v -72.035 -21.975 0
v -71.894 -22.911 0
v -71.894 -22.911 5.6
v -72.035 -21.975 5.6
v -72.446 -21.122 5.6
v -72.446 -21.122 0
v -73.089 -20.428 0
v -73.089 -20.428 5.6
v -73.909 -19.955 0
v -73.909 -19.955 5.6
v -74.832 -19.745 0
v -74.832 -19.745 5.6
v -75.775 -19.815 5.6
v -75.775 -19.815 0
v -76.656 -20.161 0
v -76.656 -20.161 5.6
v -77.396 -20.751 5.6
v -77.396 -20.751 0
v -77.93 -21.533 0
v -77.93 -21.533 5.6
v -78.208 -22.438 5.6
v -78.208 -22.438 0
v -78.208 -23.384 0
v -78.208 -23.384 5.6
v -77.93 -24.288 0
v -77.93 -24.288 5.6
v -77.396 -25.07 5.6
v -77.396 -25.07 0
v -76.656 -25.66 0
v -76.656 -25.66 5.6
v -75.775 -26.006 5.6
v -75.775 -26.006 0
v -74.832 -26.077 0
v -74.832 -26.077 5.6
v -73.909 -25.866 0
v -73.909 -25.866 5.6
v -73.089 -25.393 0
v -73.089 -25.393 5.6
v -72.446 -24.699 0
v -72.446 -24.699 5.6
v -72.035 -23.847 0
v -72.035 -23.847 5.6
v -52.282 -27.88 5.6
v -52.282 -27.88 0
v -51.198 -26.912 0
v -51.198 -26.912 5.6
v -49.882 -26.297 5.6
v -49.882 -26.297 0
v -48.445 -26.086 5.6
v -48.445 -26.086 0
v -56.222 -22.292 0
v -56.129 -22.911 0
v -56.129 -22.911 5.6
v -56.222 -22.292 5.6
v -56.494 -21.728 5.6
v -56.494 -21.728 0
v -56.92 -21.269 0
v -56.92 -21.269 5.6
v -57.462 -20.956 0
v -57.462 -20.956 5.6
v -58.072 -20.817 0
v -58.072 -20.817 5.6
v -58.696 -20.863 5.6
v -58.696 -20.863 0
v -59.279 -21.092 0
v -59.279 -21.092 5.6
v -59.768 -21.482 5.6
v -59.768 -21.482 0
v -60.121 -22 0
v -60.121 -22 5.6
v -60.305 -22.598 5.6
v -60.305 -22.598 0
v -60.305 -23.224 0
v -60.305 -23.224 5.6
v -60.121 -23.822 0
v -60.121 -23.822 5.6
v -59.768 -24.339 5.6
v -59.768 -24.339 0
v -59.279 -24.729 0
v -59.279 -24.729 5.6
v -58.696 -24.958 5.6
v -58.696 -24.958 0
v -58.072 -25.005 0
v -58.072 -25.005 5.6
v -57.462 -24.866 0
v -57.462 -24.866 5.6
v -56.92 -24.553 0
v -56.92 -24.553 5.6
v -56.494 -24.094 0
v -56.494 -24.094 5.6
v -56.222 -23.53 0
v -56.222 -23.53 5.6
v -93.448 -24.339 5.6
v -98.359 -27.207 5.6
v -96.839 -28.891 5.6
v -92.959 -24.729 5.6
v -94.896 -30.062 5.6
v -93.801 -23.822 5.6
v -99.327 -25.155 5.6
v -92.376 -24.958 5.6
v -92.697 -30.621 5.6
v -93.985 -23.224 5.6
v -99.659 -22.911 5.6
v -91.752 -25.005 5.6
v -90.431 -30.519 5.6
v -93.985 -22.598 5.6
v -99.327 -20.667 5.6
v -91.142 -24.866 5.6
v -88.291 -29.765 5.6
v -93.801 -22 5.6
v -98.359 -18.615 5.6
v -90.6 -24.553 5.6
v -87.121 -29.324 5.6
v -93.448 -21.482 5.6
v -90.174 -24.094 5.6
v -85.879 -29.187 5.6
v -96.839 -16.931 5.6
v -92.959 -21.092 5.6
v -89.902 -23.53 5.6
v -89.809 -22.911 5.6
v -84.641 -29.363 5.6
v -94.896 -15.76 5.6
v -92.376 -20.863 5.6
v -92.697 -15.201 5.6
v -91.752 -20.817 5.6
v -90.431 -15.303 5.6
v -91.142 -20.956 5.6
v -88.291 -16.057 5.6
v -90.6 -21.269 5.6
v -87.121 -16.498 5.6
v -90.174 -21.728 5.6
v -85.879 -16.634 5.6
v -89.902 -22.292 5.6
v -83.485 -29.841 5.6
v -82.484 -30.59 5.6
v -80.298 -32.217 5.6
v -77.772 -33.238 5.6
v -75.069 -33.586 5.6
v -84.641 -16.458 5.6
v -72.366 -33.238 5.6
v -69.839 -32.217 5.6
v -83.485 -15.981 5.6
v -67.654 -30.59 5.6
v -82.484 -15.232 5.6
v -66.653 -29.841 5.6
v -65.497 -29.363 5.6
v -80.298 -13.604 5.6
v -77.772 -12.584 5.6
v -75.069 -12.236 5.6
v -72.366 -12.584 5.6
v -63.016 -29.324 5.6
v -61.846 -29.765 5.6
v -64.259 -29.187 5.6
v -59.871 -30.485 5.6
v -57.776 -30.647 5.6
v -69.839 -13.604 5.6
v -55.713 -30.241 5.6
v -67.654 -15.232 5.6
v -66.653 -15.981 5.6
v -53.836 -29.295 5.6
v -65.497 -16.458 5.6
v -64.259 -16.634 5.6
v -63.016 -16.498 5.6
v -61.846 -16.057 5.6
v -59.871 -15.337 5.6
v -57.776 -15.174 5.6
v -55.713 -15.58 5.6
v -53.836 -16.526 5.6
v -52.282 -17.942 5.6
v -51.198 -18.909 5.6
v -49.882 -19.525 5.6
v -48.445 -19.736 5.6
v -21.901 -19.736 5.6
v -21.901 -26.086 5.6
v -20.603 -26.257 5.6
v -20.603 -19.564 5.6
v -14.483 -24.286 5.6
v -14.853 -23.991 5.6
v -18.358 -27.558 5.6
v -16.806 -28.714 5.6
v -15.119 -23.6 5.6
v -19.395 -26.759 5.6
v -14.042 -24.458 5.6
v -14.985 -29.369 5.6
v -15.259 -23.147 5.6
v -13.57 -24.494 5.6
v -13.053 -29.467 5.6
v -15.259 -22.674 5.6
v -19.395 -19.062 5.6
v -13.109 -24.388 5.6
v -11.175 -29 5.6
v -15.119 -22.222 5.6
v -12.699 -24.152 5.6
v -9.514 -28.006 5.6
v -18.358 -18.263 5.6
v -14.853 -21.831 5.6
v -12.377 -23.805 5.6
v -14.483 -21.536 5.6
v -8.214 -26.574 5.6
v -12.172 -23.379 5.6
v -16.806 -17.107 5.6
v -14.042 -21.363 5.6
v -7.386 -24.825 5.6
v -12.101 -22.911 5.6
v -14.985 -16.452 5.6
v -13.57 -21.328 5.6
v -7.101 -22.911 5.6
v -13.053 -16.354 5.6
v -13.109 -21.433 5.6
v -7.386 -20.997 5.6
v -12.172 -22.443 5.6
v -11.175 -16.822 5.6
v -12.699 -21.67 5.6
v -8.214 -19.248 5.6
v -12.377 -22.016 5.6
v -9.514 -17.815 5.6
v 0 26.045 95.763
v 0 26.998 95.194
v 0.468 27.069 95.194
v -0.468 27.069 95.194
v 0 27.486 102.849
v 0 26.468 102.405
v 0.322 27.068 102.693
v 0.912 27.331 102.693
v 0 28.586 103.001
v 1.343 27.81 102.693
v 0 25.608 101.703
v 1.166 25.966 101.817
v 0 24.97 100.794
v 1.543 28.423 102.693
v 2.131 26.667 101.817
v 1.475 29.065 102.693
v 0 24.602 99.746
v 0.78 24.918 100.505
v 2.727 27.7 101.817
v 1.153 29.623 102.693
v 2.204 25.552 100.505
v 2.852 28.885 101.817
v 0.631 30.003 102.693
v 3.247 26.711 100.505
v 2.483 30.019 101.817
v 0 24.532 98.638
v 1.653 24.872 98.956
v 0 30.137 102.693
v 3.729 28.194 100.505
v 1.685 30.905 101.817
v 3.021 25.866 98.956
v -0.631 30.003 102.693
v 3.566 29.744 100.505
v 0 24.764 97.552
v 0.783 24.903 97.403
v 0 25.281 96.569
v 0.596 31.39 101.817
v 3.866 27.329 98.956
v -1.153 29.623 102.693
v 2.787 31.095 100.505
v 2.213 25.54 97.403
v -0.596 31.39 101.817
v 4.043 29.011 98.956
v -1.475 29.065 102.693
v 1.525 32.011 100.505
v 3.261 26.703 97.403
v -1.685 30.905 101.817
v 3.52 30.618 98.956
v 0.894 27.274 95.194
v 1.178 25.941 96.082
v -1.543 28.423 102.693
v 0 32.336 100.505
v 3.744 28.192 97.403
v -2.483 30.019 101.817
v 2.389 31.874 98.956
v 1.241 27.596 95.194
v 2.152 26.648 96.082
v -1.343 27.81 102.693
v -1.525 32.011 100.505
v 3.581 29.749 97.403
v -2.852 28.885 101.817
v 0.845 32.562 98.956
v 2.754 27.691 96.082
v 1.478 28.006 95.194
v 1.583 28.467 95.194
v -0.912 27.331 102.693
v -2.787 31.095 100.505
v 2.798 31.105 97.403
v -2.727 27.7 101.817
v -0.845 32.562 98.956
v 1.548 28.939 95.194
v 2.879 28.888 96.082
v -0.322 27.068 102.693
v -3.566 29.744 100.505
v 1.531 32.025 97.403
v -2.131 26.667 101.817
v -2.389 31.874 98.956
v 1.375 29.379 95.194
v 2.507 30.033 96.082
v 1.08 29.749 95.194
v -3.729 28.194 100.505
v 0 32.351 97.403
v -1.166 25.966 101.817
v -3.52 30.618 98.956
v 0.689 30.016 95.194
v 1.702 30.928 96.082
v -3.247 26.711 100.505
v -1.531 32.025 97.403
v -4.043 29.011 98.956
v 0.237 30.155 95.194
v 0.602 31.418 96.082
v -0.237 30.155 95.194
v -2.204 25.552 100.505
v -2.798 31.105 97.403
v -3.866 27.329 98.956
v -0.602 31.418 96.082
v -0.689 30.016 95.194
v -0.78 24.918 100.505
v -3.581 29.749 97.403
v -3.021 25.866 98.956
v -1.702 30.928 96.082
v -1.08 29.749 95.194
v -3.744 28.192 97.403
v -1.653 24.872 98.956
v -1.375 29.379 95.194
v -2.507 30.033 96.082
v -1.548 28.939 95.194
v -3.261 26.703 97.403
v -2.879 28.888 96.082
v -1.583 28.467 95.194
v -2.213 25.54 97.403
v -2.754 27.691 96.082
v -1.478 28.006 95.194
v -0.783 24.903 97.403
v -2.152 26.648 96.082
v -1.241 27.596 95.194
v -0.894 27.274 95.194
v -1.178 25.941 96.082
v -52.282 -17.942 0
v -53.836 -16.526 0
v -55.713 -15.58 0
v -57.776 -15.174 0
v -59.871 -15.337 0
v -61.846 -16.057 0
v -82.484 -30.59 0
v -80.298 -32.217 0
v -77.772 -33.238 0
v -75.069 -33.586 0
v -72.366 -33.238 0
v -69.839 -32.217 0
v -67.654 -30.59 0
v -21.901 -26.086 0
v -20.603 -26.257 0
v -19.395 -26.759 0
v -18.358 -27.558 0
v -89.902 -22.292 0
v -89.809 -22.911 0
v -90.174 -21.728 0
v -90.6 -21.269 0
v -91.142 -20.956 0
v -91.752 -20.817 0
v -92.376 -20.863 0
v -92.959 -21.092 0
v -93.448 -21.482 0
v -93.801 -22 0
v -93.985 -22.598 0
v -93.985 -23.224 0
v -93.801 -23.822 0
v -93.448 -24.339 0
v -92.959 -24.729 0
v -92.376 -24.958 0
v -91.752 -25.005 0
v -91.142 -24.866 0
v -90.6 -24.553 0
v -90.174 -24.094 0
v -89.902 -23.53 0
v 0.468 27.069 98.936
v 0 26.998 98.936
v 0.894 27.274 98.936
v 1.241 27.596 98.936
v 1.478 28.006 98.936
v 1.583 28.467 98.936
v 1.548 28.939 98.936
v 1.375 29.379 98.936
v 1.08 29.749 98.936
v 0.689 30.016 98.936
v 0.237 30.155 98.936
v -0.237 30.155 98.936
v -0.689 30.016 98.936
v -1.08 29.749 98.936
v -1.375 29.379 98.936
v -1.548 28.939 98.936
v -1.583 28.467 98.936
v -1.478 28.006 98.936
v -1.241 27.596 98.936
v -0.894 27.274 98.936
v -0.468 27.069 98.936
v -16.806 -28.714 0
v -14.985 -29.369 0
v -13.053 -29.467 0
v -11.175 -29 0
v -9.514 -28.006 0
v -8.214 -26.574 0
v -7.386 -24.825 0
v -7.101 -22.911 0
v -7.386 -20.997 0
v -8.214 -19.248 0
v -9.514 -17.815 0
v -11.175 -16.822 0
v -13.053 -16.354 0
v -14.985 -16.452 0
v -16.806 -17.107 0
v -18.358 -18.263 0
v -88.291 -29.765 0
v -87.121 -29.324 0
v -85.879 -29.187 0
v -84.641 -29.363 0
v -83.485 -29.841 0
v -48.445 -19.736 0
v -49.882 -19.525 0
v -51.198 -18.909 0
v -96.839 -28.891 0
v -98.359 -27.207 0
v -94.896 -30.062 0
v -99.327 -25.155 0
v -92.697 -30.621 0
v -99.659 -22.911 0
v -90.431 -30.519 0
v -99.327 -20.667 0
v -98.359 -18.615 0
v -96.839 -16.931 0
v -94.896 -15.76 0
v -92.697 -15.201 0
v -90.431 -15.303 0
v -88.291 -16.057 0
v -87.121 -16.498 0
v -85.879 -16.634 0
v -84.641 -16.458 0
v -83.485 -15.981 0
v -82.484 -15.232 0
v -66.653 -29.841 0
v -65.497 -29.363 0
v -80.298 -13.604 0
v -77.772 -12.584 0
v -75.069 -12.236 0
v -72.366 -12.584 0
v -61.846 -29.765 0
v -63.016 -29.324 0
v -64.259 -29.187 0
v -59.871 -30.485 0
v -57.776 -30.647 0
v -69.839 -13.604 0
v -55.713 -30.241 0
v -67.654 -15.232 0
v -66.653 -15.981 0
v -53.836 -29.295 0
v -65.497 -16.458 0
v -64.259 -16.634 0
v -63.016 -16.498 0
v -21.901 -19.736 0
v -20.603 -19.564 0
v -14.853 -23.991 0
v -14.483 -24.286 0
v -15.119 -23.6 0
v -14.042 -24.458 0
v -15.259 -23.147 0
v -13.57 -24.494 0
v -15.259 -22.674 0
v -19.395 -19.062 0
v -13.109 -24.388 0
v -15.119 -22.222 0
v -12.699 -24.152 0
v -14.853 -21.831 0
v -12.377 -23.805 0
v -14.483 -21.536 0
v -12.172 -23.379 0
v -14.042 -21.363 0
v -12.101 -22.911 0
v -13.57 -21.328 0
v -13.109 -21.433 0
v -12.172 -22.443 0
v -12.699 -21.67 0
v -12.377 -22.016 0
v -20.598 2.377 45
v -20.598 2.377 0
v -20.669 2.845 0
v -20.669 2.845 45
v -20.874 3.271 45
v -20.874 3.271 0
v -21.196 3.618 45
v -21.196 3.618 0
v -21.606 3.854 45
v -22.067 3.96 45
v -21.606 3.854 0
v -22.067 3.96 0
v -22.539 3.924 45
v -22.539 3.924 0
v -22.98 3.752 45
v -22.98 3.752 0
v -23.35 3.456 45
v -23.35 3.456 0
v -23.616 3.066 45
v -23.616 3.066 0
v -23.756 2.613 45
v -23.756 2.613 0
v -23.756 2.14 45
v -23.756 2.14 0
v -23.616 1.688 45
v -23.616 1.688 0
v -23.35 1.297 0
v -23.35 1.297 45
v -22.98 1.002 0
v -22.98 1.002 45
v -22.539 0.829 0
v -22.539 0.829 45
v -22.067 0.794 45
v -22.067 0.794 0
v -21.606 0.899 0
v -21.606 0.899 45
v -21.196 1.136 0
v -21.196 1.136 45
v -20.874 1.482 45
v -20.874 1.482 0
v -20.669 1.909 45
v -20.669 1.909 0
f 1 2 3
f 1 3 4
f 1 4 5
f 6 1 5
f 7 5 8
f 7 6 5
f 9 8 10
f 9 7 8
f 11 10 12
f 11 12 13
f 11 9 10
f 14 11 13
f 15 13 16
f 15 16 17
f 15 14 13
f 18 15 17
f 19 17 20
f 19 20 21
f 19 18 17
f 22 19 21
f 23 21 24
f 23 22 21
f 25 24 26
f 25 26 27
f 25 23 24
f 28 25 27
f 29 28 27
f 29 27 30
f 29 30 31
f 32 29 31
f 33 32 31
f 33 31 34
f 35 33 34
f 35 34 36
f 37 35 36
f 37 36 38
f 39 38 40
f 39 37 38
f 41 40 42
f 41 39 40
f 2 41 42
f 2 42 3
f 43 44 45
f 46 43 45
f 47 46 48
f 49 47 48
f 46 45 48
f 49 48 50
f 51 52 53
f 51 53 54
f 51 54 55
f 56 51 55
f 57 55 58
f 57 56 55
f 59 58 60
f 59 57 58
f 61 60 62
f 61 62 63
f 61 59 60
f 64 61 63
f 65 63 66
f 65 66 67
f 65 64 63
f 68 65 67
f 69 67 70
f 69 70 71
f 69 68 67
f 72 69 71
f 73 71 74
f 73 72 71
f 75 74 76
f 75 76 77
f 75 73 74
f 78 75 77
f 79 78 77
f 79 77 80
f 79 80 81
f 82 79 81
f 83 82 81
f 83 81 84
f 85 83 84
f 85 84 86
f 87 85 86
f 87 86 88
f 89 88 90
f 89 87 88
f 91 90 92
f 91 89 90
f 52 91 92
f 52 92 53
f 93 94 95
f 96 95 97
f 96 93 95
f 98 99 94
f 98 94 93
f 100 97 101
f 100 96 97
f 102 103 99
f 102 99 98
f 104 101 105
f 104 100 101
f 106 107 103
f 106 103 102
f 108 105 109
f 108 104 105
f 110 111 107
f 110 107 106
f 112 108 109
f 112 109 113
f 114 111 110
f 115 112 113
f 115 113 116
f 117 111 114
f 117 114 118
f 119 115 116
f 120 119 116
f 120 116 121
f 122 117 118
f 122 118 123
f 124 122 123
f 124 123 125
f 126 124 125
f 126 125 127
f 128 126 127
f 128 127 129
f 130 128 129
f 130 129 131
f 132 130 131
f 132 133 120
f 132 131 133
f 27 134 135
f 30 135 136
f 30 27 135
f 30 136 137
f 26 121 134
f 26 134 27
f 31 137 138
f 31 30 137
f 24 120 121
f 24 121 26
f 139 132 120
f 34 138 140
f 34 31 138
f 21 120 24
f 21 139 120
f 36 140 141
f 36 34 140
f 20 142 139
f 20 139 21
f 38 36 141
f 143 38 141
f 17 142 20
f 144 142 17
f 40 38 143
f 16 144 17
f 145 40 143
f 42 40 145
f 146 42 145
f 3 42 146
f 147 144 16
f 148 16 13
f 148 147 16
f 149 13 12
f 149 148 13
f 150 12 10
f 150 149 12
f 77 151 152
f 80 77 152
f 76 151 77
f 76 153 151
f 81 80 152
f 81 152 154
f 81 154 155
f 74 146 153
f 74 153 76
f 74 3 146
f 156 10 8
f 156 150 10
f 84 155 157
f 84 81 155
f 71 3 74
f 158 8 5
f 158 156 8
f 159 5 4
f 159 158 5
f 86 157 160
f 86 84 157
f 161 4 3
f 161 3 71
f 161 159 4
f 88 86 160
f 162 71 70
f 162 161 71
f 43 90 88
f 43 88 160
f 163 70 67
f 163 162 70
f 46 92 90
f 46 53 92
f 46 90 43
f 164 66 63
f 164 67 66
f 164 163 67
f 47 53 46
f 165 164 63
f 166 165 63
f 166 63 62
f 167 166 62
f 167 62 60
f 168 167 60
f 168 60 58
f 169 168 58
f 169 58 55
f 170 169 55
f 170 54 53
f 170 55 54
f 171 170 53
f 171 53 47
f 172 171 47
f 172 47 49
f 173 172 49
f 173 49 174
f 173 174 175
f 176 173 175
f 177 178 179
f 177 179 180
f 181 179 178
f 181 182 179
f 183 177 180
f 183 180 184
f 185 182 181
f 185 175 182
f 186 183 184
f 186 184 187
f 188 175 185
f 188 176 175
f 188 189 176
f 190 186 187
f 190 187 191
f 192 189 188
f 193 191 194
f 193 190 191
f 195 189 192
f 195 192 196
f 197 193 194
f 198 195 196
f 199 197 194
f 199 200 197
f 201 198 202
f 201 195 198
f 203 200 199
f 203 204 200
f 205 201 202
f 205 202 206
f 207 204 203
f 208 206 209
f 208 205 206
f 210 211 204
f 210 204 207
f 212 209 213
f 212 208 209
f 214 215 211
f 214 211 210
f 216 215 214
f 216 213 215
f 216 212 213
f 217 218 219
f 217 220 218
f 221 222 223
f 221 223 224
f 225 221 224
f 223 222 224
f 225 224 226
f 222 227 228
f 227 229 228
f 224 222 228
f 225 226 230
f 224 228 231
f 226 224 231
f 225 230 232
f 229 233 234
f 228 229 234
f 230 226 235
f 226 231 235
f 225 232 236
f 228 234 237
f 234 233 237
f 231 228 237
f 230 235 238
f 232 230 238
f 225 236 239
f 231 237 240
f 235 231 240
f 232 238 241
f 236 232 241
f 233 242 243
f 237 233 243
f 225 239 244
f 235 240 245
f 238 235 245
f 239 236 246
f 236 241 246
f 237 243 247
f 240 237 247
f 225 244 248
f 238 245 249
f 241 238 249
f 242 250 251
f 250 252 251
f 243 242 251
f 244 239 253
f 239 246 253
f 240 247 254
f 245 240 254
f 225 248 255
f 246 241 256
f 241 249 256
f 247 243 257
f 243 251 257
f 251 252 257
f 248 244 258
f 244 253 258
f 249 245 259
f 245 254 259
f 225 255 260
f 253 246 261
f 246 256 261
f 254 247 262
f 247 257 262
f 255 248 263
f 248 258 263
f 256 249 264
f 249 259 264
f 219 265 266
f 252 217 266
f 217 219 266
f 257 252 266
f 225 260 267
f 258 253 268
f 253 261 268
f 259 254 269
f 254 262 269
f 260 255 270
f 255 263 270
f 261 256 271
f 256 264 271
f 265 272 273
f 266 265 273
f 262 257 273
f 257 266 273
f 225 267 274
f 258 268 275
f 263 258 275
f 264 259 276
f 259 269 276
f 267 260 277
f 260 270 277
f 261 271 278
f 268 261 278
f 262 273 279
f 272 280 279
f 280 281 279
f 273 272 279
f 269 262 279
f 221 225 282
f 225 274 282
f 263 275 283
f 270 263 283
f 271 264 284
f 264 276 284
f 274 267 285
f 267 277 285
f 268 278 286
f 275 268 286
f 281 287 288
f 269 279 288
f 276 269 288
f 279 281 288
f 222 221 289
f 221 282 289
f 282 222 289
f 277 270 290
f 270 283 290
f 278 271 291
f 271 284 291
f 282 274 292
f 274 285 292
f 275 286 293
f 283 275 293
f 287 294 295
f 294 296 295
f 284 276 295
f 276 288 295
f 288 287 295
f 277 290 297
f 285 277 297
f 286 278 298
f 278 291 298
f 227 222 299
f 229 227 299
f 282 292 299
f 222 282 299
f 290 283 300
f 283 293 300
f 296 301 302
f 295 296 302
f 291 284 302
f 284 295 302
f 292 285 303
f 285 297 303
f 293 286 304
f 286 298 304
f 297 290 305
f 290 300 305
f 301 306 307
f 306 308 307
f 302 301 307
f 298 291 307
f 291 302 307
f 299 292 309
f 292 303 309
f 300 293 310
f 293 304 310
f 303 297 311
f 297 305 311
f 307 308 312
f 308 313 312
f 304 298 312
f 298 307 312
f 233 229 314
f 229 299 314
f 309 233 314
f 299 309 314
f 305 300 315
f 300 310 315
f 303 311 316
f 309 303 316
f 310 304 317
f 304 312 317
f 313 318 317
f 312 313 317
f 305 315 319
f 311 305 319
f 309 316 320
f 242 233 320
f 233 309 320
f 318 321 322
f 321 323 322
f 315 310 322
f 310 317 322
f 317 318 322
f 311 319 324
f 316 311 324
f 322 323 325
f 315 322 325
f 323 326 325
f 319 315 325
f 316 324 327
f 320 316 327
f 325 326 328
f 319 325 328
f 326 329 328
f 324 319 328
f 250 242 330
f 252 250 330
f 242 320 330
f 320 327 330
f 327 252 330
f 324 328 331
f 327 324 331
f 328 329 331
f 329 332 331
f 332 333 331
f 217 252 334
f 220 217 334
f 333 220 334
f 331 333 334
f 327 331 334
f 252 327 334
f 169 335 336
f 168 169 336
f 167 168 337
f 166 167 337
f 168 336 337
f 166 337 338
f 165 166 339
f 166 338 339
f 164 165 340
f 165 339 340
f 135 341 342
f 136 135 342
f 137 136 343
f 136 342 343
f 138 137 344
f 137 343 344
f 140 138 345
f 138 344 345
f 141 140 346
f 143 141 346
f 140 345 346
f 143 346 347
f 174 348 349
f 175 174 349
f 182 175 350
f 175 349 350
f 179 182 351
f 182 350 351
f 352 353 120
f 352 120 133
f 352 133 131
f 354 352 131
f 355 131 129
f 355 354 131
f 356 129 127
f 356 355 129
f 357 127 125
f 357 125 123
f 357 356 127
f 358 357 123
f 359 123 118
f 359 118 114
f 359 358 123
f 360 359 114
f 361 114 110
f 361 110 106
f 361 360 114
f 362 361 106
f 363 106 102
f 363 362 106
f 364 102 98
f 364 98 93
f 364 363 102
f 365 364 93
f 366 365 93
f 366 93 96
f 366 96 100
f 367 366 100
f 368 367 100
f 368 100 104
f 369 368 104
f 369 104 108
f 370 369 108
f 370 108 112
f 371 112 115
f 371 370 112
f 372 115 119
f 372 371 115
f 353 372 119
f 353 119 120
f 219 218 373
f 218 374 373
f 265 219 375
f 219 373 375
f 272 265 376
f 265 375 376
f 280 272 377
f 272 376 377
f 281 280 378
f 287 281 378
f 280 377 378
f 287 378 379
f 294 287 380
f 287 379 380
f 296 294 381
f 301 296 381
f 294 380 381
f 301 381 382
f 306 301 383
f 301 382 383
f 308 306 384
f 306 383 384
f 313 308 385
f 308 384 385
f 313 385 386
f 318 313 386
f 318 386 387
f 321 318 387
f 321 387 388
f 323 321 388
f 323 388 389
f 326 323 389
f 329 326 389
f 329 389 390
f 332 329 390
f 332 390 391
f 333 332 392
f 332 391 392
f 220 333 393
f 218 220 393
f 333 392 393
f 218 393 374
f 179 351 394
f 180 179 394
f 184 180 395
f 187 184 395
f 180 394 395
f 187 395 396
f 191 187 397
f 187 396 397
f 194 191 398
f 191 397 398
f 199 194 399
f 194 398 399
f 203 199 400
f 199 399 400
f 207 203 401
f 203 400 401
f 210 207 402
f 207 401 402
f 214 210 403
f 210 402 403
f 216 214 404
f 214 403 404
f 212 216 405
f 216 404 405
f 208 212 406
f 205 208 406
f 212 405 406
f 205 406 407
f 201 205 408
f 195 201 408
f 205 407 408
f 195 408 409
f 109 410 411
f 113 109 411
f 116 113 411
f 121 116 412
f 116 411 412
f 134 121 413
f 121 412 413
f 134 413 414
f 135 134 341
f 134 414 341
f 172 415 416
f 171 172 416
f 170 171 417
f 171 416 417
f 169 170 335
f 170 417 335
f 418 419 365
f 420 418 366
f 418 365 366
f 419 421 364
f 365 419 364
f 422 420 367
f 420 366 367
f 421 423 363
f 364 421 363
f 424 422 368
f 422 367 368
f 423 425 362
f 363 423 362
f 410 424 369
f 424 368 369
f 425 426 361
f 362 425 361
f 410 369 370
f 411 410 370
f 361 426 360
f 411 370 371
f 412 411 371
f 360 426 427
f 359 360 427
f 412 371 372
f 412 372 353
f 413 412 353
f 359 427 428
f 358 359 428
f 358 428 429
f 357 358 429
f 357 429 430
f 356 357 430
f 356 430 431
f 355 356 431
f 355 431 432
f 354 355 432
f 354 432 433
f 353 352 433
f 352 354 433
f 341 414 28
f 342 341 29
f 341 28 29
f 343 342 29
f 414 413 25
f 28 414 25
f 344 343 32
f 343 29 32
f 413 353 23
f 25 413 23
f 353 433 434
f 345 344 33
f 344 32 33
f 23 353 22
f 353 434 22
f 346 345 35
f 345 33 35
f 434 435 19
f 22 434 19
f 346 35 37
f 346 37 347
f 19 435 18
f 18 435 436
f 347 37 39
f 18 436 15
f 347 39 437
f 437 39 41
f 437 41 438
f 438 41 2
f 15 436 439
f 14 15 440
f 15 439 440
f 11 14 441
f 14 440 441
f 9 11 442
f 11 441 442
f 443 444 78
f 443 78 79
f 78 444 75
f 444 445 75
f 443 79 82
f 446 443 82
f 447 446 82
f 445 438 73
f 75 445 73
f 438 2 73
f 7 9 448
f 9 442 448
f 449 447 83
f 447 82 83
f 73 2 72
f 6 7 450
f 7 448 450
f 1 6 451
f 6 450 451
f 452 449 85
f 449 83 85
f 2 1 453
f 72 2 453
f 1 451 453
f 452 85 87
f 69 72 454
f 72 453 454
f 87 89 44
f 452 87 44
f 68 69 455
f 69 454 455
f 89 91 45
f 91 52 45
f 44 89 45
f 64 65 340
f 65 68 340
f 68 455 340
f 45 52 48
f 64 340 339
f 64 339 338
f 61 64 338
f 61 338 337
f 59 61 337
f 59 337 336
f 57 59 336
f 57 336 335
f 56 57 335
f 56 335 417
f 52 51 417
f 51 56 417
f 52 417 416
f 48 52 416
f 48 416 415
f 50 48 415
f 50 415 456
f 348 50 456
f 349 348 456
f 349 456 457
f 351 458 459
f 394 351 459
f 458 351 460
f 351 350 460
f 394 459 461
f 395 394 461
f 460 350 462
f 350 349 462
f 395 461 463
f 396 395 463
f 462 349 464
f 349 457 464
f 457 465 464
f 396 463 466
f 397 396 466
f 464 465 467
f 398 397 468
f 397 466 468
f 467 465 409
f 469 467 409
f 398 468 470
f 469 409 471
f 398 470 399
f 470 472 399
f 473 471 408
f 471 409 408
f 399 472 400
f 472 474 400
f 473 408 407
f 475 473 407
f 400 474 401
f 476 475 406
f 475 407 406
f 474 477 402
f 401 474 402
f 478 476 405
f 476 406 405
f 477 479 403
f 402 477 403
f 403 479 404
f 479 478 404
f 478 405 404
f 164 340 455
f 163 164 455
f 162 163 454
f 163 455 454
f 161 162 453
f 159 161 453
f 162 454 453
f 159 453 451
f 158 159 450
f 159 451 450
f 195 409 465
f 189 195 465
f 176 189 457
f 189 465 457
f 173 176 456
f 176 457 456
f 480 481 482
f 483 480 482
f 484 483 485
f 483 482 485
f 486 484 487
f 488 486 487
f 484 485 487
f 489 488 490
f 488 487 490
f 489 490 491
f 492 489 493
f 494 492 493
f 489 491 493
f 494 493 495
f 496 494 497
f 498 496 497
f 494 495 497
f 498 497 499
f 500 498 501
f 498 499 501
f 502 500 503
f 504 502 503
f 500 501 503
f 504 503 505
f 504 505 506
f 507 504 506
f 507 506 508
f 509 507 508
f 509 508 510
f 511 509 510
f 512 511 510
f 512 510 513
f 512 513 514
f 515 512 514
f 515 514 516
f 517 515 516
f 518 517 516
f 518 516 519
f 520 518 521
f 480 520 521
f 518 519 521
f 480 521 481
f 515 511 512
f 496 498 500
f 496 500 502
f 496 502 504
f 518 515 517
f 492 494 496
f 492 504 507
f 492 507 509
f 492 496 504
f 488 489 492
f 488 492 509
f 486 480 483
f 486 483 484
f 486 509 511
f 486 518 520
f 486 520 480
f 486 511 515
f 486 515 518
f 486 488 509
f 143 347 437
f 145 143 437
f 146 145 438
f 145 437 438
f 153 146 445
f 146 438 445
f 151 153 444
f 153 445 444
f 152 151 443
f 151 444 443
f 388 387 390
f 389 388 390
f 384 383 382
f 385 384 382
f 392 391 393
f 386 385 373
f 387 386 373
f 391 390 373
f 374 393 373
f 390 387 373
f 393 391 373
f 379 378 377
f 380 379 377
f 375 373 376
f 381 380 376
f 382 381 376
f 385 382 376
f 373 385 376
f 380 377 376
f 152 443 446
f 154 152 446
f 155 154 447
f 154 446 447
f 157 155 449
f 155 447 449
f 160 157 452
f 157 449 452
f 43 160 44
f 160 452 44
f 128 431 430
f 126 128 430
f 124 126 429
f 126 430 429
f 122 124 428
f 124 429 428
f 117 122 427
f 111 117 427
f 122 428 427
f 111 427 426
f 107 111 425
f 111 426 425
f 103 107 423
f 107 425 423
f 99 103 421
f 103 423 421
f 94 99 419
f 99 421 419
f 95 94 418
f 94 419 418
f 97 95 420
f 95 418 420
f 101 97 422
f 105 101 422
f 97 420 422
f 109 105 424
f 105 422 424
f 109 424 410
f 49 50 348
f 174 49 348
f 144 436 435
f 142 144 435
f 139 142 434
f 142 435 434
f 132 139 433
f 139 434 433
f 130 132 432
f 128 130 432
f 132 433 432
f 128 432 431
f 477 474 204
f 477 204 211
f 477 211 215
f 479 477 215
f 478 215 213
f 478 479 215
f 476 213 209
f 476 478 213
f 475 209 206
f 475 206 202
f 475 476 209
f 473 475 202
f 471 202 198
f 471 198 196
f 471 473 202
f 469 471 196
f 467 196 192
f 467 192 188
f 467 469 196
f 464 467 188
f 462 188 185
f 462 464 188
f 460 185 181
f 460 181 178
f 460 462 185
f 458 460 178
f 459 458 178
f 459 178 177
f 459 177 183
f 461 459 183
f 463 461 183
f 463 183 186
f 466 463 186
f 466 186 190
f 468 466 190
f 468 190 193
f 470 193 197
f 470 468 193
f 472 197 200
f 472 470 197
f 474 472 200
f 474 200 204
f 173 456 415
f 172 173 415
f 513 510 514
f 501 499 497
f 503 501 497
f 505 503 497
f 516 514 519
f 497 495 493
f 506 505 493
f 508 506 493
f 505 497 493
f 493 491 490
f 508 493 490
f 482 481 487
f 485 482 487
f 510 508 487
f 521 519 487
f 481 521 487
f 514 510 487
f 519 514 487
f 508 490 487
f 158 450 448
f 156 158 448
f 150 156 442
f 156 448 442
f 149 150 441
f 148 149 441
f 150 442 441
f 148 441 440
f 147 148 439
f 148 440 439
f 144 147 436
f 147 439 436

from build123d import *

# Parameters (mm, degrees)
F3_R     = 1.5875
F4_DEPTH = 45
F5_R     = 3.175
F5_R_2   = 2.1
F5_R_3   = 1.5875
F6_DEPTH = 5.6


with BuildPart() as f2:
    # F1 (on Right) → F2 (revolve)
    with BuildSketch(Plane.YZ):
        with BuildLine():
            Line((28.5856276751, 98.9358499646), (28.5856276751, 103.0008499646))
            ThreePointArc((28.5856276751, 103.0008499646), (24.6021447583, 99.7458430831), (26.9981276751, 95.1936489078))
            Line((26.9981276751, 95.1936489078), (26.9981276751, 98.9358499646))
            Line((26.9981276751, 98.9358499646), (28.5856276751, 98.9358499646))
        make_face()
    revolve(axis=Axis((0, 28.5856276751, 100.9683499646), (0, 0, 1)))


with BuildPart() as f4:
    # F3 (on Top) → F4 (new body)
    with BuildSketch(Plane.XY):
        with Locations((-22.1857912838, 2.3767193779)):
            Circle(F3_R)
    extrude(amount=F4_DEPTH)


with BuildPart() as f6:
    # F5 (on Top) → F6 (new body)
    with BuildSketch(Plane.XY):
        with BuildLine():
            ThreePointArc((-61.8464328335, -16.0568153762), (-64.8836940912, -16.5852120292), (-67.653551355, -15.2316797214))
            ThreePointArc((-67.653551355, -15.2316797214), (-75.0689274046, -12.2357306421), (-82.4843034542, -15.2316797214))
            ThreePointArc((-82.4843034542, -15.2316797214), (-85.2541607181, -16.5852120292), (-88.2914219758, -16.0568153762))
            ThreePointArc((-88.2914219758, -16.0568153762), (-99.6589274046, -22.9107306421), (-88.2914219758, -29.764645908))
            ThreePointArc((-88.2914219758, -29.764645908), (-85.2541607181, -29.236249255), (-82.4843034542, -30.5897815628))
            ThreePointArc((-82.4843034542, -30.5897815628), (-75.0689274046, -33.5857306421), (-67.653551355, -30.5897815628))
            ThreePointArc((-67.653551355, -30.5897815628), (-64.8836940912, -29.236249255), (-61.8464328335, -29.764645908))
            ThreePointArc((-61.8464328335, -29.764645908), (-56.7305614716, -30.5145059893), (-52.2816280335, -27.8798482891))
            ThreePointArc((-52.2816280335, -27.8798482891), (-50.5625119947, -26.5564143711), (-48.4446606973, -26.0857306421))
            Line((-48.4446606973, -26.0857306421), (-21.9010849317, -26.0857306421))
            ThreePointArc((-21.9010849317, -26.0857306421), (-19.9824318173, -26.4685052603), (-18.3575433882, -27.5582225515))
            ThreePointArc((-18.3575433882, -27.5582225515), (-7.1014274046, -22.9107306421), (-18.3575433882, -18.2632387327))
            ThreePointArc((-18.3575433882, -18.2632387327), (-19.9824318173, -19.3529560239), (-21.9010849317, -19.7357306421))
            Line((-21.9010849317, -19.7357306421), (-48.4446606973, -19.7357306421))
            ThreePointArc((-48.4446606973, -19.7357306421), (-50.5625119947, -19.265046913), (-52.2816280335, -17.941612995))
            ThreePointArc((-52.2816280335, -17.941612995), (-56.7305614716, -15.3069552949), (-61.8464328335, -16.0568153762))
        make_face()
        with Locations((-75.0689274046, -22.9107306421)):
            Circle(F5_R, mode=Mode.SUBTRACT)
        with Locations((-91.9089274046, -22.9107306421)):
            Circle(F5_R_2, mode=Mode.SUBTRACT)
        with Locations((-58.2289274046, -22.9107306421)):
            Circle(F5_R_2, mode=Mode.SUBTRACT)
        with Locations((-13.6889274046, -22.9107306421)):
            Circle(F5_R_3, mode=Mode.SUBTRACT)
    extrude(amount=F6_DEPTH)


solid = Compound([f2.part, f4.part, f6.part])
